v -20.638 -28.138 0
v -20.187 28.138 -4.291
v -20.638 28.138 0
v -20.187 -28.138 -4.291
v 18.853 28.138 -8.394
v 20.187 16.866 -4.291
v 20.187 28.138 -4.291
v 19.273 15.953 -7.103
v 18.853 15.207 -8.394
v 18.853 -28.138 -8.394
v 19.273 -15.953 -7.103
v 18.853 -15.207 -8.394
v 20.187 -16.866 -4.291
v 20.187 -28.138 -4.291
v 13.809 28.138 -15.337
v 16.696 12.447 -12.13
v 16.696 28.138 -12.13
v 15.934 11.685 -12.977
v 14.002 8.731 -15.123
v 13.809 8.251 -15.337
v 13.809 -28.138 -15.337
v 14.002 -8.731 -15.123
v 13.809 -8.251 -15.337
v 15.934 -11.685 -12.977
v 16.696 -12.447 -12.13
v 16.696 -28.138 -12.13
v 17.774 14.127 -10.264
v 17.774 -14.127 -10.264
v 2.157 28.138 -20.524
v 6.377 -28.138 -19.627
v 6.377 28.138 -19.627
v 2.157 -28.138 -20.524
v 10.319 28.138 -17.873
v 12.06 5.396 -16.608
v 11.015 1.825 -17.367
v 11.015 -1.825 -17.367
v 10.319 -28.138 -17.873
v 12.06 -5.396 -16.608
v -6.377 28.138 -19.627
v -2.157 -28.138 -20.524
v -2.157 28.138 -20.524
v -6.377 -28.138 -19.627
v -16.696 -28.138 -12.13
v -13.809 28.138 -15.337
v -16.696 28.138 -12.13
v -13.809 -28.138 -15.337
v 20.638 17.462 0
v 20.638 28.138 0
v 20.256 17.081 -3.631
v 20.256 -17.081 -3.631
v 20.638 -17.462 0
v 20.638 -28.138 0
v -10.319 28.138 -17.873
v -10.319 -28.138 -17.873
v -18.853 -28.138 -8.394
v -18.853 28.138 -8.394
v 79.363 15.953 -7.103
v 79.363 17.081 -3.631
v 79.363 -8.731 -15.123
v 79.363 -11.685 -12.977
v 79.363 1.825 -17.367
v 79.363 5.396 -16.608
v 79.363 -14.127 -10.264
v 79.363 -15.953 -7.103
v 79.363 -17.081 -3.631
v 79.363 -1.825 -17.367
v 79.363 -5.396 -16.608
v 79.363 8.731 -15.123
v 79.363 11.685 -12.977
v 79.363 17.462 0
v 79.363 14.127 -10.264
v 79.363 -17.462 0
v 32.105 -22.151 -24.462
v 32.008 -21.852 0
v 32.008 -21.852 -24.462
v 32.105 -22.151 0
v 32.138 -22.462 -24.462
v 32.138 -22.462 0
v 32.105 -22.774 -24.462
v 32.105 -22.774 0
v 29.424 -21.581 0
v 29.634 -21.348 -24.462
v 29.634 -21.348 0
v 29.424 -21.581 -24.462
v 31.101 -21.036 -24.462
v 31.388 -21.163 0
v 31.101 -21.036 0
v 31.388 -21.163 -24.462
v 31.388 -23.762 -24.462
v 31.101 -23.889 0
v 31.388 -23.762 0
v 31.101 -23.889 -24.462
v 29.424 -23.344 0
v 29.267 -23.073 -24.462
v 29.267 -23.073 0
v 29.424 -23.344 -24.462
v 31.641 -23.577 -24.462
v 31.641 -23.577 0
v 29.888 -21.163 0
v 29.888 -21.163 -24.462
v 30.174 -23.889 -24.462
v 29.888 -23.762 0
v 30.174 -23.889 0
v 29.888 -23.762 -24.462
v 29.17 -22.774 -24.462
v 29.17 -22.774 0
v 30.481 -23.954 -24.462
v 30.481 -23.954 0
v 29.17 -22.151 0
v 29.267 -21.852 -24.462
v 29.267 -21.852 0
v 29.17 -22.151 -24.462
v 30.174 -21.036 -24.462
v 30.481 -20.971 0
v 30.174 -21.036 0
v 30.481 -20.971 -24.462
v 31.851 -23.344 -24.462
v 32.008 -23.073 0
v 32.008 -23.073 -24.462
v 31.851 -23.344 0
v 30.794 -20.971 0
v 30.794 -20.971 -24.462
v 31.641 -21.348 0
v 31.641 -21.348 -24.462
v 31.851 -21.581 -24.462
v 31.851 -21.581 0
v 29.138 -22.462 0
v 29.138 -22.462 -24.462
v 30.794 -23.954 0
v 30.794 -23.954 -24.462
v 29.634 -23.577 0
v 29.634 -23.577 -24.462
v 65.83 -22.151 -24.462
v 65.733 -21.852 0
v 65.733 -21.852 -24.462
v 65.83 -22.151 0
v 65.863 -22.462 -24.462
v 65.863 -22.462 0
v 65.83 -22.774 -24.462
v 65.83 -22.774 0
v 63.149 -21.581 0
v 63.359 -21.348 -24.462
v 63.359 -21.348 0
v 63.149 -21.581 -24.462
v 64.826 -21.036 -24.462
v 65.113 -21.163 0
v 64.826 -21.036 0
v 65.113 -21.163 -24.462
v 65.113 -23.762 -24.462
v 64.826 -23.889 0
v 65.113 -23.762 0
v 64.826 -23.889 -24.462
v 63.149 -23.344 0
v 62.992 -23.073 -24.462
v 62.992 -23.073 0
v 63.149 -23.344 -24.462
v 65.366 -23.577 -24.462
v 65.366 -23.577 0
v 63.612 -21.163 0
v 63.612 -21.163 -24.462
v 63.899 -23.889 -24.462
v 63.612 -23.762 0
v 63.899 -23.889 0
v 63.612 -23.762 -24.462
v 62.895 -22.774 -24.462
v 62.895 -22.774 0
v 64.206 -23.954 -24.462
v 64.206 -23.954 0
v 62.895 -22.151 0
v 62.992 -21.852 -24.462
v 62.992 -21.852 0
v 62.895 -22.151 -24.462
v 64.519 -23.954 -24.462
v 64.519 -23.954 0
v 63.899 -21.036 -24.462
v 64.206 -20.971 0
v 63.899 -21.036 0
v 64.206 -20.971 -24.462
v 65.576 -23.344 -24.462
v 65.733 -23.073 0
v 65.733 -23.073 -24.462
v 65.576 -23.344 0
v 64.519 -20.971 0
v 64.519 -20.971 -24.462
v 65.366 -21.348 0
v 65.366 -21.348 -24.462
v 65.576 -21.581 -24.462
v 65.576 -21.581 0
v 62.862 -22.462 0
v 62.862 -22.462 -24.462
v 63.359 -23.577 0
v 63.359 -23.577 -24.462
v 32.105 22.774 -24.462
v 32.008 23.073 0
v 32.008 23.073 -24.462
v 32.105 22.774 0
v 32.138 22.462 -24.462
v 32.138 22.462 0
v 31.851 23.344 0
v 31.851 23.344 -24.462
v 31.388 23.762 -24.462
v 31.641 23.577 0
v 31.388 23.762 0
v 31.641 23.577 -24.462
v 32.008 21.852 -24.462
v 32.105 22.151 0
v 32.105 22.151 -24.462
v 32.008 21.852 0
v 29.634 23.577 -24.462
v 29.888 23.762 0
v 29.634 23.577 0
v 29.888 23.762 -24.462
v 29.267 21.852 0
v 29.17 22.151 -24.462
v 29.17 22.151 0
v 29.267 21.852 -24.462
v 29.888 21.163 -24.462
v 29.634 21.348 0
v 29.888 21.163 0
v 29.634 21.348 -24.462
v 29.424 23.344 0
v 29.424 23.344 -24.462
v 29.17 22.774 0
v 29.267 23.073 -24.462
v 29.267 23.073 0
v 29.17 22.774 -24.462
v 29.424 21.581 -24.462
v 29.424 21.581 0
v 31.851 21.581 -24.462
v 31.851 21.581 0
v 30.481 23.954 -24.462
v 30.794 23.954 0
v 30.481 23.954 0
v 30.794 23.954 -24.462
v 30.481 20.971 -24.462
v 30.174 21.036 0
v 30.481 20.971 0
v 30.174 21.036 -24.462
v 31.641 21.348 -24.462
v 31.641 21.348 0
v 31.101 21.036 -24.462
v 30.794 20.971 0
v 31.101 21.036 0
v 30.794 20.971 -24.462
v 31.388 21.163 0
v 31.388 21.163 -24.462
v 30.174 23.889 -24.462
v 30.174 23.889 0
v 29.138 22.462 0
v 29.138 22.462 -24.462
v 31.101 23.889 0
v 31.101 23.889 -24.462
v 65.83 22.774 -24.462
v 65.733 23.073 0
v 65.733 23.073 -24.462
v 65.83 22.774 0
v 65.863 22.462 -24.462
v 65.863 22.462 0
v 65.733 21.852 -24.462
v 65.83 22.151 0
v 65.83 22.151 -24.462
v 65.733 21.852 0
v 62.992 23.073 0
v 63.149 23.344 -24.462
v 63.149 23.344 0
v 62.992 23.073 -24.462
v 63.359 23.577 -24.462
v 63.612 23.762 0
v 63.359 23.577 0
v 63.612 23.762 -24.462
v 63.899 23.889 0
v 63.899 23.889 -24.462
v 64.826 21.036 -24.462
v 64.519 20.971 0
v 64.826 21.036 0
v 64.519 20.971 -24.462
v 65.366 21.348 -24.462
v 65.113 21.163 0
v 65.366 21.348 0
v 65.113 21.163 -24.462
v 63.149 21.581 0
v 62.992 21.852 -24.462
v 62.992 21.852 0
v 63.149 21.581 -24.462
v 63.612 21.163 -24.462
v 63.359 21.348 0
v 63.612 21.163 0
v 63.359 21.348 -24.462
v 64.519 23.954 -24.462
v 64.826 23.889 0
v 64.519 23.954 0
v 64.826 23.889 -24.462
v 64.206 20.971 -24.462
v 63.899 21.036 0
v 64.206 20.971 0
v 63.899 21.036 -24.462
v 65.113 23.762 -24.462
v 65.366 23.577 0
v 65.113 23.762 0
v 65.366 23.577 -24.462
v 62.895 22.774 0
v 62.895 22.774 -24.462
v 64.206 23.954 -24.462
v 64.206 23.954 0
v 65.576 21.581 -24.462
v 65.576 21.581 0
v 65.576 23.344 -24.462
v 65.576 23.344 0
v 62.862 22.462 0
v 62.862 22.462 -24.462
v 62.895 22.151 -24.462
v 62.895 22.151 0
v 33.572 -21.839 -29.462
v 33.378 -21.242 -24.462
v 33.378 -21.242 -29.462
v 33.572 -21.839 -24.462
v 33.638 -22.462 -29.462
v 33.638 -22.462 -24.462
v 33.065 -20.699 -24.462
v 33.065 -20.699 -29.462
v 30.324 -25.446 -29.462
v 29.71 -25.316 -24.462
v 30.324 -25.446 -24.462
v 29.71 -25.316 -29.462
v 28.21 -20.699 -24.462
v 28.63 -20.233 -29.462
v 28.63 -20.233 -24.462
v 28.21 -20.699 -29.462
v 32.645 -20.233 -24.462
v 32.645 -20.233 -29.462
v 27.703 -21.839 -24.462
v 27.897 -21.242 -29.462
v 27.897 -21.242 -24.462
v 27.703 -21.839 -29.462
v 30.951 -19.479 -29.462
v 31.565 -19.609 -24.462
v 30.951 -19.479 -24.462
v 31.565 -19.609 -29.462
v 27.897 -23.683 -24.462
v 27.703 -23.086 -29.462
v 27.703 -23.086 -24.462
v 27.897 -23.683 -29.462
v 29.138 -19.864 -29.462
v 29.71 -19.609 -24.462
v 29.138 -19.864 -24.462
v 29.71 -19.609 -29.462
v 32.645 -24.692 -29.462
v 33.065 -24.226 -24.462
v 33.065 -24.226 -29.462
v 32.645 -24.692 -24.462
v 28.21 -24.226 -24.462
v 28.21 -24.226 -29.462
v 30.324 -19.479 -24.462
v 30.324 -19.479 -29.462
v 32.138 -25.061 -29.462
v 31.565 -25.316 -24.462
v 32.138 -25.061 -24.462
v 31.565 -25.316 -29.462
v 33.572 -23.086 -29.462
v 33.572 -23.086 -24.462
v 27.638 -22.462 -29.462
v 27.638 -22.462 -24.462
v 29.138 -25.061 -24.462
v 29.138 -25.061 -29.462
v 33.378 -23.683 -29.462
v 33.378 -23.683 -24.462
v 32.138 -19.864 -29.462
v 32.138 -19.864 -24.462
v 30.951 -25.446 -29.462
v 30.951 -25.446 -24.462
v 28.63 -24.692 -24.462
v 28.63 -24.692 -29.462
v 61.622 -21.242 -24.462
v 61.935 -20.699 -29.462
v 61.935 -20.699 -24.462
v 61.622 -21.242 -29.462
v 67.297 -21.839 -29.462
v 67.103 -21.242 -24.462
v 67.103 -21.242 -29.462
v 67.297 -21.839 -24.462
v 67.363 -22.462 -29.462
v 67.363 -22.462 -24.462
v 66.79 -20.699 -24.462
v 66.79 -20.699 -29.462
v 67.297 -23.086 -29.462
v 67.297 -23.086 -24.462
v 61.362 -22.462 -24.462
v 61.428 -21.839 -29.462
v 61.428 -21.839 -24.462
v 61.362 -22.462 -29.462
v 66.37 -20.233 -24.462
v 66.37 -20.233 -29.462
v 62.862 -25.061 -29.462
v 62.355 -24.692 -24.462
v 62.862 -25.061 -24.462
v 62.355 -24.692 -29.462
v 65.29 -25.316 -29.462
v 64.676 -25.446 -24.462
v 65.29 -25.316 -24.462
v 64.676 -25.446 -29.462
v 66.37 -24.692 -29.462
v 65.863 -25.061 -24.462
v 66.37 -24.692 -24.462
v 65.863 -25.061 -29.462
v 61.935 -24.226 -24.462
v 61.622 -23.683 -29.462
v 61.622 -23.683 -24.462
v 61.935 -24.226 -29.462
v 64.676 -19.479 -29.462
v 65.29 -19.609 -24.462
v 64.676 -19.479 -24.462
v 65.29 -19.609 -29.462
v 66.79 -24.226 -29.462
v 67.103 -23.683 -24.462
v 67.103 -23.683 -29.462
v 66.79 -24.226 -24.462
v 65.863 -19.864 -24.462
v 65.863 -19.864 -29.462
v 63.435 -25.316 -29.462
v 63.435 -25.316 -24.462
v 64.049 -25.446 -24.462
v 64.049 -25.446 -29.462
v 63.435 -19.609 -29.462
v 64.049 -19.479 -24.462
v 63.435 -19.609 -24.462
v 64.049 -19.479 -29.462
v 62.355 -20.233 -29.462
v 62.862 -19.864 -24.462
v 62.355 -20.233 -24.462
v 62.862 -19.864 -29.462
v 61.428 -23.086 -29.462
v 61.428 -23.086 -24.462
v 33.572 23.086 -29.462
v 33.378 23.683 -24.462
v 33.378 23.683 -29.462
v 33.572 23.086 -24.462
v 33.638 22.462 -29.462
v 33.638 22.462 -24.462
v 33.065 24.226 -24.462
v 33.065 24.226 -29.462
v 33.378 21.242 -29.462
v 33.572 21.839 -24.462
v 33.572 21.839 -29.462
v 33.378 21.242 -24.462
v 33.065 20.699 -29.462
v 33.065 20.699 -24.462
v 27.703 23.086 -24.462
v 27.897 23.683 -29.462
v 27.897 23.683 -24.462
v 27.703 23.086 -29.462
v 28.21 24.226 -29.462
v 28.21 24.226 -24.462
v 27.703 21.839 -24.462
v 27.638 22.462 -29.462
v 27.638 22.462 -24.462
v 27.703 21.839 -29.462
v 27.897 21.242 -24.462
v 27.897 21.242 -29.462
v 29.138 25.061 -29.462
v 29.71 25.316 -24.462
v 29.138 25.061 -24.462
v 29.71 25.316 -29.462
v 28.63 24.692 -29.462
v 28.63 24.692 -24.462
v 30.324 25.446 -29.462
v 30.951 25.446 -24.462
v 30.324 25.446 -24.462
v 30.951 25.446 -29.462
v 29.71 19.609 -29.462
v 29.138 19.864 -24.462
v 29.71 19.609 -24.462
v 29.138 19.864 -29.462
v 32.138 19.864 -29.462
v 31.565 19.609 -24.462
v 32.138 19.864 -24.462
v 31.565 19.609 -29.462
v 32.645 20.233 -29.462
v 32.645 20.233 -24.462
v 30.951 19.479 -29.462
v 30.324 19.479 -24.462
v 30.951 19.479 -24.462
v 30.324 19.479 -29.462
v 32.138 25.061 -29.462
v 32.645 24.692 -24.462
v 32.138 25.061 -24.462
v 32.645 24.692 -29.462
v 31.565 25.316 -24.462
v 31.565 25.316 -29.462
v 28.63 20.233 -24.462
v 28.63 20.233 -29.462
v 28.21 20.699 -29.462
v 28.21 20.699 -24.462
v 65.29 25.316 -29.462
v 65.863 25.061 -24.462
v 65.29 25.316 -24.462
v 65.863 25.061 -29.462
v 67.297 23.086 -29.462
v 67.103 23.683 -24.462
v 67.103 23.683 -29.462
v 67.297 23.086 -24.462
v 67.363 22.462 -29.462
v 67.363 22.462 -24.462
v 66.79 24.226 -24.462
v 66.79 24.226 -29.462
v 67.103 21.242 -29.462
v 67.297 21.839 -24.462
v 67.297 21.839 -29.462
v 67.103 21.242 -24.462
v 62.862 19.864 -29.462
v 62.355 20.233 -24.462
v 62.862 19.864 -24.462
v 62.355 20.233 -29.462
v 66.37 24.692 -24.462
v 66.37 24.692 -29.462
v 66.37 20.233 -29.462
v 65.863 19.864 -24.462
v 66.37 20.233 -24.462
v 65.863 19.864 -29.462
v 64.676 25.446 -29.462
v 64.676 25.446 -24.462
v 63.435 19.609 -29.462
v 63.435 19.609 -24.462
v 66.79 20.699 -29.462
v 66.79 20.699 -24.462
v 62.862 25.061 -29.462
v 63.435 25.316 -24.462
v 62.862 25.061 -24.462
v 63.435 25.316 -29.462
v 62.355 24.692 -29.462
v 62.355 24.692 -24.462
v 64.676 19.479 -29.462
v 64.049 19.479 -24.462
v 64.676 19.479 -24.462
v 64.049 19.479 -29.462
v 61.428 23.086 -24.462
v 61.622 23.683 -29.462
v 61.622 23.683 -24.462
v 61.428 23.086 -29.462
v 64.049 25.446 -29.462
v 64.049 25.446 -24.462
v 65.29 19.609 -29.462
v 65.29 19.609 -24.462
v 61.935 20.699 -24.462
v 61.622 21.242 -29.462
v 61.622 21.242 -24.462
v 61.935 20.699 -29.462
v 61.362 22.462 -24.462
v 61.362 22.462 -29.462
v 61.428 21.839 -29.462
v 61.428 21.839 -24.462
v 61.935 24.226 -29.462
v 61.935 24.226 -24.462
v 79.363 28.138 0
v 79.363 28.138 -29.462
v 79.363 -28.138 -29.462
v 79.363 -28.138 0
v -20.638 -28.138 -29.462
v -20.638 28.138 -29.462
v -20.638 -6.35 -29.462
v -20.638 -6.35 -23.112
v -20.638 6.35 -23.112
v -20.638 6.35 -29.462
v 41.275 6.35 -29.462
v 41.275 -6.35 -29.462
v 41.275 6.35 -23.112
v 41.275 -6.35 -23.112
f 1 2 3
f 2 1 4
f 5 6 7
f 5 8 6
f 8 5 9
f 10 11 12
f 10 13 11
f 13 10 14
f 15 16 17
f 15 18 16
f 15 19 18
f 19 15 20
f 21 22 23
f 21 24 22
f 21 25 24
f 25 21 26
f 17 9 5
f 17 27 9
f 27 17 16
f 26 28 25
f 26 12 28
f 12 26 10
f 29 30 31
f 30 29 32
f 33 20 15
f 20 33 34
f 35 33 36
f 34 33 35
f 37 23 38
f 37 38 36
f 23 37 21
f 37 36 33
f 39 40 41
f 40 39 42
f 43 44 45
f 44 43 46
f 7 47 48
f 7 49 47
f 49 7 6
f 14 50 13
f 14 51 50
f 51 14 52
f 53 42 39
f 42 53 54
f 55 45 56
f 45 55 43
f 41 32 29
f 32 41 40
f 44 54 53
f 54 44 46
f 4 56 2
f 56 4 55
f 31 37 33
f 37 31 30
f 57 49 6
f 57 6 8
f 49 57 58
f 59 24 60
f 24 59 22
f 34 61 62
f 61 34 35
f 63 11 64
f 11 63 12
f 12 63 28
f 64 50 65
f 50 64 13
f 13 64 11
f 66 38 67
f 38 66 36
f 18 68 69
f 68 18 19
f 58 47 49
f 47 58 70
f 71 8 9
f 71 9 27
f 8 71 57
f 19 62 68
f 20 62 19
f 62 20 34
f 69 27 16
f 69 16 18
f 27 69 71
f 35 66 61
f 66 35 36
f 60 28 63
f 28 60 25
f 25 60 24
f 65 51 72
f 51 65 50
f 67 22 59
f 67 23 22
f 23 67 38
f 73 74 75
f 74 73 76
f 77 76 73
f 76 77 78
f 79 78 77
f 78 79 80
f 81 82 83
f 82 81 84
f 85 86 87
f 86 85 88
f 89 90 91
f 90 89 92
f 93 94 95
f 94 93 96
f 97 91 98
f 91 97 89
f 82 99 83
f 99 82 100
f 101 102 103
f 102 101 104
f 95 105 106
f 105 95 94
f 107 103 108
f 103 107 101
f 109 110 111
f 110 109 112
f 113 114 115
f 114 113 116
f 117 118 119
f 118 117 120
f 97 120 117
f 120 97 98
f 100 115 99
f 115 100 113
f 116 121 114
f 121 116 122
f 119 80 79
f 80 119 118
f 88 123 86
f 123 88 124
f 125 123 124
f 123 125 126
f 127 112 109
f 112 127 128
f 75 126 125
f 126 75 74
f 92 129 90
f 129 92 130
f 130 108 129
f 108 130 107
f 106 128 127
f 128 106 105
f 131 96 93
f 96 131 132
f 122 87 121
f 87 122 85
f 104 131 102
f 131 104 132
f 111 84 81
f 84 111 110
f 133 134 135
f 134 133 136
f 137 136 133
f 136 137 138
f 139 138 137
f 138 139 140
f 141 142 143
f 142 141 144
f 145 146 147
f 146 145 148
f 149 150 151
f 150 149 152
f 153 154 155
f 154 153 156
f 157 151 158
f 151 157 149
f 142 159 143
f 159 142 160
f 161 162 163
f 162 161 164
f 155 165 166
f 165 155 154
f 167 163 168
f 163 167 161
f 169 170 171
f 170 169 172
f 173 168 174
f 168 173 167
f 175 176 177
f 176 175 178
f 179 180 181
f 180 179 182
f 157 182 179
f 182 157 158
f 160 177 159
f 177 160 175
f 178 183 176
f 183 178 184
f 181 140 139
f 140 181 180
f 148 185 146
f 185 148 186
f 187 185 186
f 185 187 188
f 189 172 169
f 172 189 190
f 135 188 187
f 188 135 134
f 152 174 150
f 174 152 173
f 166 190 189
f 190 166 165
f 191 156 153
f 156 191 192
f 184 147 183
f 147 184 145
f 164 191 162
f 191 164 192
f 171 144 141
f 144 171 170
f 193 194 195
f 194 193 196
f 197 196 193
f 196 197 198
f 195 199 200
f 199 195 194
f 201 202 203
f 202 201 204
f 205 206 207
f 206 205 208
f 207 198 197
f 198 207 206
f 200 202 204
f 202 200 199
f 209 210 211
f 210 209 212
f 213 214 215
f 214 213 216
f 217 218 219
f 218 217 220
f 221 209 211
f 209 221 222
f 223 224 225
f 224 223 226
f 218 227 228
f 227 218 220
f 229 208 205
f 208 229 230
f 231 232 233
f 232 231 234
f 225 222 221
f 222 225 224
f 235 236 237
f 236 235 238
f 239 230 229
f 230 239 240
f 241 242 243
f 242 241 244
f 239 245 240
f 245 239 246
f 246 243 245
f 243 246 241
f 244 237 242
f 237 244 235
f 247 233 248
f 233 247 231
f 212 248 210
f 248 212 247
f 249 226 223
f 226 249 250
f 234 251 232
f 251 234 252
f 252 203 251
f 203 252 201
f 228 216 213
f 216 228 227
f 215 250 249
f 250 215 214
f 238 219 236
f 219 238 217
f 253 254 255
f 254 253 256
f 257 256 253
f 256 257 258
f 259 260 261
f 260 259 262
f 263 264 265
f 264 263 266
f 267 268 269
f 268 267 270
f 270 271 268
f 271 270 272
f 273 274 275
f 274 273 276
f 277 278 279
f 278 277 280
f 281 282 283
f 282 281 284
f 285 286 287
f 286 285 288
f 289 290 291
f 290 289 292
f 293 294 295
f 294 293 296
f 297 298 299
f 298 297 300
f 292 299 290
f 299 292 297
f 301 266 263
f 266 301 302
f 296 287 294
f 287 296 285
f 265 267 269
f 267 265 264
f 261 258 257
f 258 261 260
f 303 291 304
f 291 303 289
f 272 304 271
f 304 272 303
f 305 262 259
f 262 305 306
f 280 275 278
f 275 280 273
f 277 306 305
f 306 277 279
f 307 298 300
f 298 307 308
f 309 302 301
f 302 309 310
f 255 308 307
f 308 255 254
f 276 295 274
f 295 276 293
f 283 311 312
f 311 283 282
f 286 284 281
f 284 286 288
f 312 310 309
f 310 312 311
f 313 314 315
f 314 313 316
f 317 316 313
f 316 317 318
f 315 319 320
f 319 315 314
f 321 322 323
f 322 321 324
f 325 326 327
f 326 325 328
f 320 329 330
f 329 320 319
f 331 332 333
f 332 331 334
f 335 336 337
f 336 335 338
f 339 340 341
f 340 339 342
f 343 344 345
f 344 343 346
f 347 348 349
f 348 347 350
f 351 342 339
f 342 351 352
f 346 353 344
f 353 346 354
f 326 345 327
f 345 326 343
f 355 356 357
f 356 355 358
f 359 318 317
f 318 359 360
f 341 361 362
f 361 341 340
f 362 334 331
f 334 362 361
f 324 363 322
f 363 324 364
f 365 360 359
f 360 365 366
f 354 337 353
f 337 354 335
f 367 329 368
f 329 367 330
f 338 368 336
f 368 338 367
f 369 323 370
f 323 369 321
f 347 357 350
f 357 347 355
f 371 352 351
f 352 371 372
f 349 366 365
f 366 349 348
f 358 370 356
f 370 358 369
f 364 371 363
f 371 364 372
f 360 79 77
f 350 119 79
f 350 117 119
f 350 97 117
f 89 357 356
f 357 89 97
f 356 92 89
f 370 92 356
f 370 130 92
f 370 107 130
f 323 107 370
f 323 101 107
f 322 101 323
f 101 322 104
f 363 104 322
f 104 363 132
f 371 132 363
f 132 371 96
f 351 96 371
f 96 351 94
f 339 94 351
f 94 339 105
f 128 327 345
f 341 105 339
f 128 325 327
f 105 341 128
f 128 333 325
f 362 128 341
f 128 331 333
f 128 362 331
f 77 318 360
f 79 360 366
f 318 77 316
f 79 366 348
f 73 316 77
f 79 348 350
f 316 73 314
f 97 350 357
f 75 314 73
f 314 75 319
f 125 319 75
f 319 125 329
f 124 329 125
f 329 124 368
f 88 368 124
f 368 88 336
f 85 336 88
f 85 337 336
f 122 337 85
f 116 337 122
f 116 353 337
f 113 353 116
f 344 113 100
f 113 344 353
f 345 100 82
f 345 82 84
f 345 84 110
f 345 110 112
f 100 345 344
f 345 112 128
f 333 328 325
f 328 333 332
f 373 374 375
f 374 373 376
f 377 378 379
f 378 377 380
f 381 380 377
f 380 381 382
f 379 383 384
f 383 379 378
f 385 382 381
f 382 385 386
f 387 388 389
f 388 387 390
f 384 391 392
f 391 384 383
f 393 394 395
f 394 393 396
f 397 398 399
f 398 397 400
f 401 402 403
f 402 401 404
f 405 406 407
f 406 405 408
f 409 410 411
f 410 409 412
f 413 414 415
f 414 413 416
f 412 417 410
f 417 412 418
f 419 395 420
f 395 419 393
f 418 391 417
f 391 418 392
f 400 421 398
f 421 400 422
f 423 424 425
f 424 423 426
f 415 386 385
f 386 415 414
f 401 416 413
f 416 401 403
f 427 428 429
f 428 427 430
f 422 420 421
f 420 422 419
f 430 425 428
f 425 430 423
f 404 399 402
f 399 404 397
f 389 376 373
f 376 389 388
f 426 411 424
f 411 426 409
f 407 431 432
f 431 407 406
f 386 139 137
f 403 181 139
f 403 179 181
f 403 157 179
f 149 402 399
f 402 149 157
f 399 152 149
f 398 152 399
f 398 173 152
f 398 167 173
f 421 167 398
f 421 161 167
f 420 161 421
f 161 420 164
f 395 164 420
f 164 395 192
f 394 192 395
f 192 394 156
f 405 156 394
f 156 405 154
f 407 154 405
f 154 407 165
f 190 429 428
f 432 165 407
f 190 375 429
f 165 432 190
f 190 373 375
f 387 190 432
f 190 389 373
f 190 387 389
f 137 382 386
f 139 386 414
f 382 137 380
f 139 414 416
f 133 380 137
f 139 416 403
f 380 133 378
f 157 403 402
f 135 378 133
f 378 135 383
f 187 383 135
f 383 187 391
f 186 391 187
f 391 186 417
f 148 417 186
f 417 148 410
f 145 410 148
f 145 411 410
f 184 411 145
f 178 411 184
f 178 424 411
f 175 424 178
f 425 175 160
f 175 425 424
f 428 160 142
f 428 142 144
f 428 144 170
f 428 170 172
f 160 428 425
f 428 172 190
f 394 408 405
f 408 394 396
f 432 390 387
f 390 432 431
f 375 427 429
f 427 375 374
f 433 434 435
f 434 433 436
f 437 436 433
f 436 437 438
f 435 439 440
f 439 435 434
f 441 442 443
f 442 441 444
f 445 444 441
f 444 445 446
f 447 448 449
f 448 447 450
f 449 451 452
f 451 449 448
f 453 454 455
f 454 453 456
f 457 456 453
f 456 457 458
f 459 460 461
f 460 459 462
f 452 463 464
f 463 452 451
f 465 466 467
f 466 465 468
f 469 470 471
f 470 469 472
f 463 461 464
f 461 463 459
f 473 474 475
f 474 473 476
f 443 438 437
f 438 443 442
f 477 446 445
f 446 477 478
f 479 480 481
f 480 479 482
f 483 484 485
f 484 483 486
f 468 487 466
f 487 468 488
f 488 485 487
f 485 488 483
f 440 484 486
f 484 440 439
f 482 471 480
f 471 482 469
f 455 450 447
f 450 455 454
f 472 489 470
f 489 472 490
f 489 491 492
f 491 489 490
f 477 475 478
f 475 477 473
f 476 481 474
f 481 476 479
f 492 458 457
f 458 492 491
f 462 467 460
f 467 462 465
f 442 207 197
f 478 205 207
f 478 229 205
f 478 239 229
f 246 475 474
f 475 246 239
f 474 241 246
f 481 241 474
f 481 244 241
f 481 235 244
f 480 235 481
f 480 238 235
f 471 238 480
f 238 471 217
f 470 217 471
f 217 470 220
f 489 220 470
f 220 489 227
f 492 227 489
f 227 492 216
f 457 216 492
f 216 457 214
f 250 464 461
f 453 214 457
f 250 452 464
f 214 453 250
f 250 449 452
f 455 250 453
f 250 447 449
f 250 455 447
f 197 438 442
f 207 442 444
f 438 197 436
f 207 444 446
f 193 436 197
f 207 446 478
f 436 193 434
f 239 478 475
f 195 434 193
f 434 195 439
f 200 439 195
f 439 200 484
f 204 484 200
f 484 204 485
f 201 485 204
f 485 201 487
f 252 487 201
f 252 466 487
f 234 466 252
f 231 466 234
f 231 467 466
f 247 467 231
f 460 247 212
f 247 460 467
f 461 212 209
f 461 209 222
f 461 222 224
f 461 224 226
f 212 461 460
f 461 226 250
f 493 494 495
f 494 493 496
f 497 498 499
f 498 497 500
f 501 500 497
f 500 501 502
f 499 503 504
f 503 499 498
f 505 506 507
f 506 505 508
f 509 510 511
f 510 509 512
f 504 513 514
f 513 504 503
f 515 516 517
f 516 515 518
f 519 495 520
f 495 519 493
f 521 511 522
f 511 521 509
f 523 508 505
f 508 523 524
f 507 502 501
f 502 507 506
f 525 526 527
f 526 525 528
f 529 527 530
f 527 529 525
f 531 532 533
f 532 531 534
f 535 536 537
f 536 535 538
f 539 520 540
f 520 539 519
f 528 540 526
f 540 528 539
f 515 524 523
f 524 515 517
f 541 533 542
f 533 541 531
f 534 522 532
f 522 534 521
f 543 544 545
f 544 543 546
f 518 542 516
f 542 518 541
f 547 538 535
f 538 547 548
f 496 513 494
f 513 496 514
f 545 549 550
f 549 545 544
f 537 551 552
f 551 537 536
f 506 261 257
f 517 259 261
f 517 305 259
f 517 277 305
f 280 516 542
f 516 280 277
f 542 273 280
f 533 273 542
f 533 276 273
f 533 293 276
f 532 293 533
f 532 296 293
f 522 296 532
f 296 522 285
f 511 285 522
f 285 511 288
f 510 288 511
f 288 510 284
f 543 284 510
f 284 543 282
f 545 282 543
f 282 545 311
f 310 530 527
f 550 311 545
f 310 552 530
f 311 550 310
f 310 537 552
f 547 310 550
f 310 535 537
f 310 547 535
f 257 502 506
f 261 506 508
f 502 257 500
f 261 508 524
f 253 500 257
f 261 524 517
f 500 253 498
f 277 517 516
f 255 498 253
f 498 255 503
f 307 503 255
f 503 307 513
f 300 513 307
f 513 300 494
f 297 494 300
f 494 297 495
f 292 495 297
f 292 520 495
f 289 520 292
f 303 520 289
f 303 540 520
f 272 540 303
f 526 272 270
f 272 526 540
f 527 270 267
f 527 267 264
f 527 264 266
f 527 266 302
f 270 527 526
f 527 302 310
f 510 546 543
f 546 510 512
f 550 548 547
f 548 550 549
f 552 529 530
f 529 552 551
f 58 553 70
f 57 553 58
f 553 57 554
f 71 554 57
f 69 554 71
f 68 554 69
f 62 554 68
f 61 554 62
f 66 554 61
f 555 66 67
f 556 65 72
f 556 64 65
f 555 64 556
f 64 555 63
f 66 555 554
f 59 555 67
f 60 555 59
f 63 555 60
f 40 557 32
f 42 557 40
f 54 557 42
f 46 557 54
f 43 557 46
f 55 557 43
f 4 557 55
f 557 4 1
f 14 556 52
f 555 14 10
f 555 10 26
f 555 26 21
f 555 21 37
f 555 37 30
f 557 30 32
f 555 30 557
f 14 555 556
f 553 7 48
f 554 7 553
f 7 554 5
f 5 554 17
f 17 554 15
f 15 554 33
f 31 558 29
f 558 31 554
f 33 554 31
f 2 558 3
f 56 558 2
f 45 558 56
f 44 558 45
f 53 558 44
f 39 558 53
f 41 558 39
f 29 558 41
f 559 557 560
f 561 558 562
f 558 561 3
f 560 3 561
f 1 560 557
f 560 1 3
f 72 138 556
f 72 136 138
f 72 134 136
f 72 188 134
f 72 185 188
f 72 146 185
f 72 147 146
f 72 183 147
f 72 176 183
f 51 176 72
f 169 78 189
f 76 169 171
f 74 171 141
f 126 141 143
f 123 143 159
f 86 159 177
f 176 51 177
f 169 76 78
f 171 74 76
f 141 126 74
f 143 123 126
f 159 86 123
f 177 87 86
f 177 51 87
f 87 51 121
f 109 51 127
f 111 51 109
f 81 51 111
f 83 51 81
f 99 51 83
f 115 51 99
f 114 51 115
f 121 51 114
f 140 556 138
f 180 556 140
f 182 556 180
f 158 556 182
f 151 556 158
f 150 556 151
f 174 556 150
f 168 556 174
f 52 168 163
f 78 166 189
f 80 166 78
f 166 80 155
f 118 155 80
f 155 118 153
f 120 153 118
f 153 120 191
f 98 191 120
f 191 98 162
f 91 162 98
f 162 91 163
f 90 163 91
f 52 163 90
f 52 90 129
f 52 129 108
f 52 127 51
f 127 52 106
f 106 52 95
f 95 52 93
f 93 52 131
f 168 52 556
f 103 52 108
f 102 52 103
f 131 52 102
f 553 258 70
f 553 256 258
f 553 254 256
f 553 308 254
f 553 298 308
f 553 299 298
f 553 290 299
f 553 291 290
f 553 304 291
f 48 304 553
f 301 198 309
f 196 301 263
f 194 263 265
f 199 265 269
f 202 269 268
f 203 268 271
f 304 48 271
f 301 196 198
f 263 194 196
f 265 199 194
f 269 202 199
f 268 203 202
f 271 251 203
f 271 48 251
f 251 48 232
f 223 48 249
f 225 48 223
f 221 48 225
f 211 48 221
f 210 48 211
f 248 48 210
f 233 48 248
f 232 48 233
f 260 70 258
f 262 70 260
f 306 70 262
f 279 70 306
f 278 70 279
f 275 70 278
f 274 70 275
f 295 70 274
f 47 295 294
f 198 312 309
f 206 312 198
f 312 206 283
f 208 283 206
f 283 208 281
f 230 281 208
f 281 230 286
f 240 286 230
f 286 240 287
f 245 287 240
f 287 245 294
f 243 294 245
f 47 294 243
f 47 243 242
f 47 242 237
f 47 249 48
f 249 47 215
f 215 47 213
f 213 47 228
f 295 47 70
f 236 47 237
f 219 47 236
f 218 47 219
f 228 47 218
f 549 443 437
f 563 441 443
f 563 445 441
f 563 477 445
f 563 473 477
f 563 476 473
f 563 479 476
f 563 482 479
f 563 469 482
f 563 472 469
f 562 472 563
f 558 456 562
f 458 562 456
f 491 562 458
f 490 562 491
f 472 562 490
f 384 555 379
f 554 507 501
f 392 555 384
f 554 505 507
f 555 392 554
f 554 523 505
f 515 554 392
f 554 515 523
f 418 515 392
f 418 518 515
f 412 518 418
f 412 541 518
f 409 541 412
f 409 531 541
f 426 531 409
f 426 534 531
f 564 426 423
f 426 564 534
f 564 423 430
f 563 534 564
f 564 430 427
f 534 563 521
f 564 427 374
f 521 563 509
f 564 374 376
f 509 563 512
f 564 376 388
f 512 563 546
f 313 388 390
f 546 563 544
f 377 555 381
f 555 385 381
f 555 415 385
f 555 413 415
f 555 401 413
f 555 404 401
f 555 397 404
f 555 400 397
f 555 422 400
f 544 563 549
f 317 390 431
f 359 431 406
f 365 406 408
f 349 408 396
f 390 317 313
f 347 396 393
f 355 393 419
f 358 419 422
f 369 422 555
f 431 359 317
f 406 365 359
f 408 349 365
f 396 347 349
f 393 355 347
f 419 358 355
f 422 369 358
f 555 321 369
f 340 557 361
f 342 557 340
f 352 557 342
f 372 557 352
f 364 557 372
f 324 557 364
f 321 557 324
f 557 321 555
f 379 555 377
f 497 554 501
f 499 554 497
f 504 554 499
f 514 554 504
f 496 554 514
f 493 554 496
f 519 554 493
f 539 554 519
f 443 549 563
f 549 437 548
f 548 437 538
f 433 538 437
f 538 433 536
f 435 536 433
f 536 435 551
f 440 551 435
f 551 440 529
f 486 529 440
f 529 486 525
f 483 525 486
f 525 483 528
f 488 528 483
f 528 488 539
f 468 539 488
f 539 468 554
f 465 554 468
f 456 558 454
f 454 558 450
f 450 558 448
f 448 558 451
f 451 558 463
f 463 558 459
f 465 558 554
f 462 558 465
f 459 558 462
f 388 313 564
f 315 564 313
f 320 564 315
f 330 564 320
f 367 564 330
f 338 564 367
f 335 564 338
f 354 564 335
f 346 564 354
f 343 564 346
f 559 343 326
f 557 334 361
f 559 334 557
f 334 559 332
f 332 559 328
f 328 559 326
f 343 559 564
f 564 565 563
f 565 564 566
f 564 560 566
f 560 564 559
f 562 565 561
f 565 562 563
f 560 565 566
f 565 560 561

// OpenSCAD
tube_lg_diam = 41.275;
tube_sm_diam = 34.925;
tube_lg_rad = tube_lg_diam / 2;
tube_sm_rad = tube_sm_diam / 2;

module tubes() {
 color("green") {
  translate([0,0,-100]) cylinder(r=tube_lg_rad, h=200);
  rotate([0,90,0]) cylinder(r=tube_sm_rad, h=200);
 }
}

bracket_width = 100;
bracket_height = tube_lg_diam + 15;
bracket_depth = tube_sm_rad + 12;
back_bracket_width = bracket_width;
back_bracket_height = bracket_height;
back_bracket_depth = tube_lg_rad + 5;


latch_width = 1.5 * tube_lg_diam;
latch_height = 12.7;
latch_depth = 6.35;

sh_rad = 1.5;
module screw_hole(rad, depth) {
 translate([0,-50,0])
  rotate([-90,0,0])
   cylinder(r=rad, h=depth, $fn=30);
}

module screw_holes(rad, depth) {
  translate([tube_lg_rad + 10, 0, tube_sm_rad + 5])
   #screw_hole(rad, depth);
  translate([bracket_width - tube_lg_rad - 15, 0, tube_sm_rad + 5])
   #screw_hole(rad, depth);
  translate([tube_lg_rad + 10, 0, -1 * (tube_sm_rad + 5)])
   #screw_hole(rad, depth);
  translate([bracket_width - tube_lg_rad - 15, 0, -1 * (tube_sm_rad + 5)])
   #screw_hole(rad, depth);
}

module bracket(wid, ht, dep) {
 difference() {
  translate([-1 * tube_lg_rad,-1 * dep,-0.5 * ht])
   cube(size=[wid,dep,ht]);
  #tubes();
  #screw_holes(sh_rad, 51);
  #screw_holes(sh_rad * 2, 50-dep+5);
 }
}

hole_dist = 28.6;

module front() {
 difference() {
  bracket(bracket_width, bracket_height, bracket_depth);
  #translate([-1*tube_lg_rad, -1*bracket_depth, -0.5 * latch_height]) cube(size=[latch_width, latch_depth,latch_height]);
  //#screw_hole(sh_rad, 51);
  //translate([hole_dist,0,0]) screw_hole(sh_rad, 51);
 }
}

module back() {
 difference() {
  bracket(back_bracket_width, back_bracket_height, back_bracket_depth);
  #translate([-1*tube_lg_rad-1,-1*tube_lg_diam-1,-0.5*back_bracket_height-1]) cube(size=[tube_lg_diam+2,tube_lg_diam+2,back_bracket_height+2]);
 }
}

//screw_hole();
rotate([90,0,0])
front();
// back:
//rotate([180,0,0])
//back();
